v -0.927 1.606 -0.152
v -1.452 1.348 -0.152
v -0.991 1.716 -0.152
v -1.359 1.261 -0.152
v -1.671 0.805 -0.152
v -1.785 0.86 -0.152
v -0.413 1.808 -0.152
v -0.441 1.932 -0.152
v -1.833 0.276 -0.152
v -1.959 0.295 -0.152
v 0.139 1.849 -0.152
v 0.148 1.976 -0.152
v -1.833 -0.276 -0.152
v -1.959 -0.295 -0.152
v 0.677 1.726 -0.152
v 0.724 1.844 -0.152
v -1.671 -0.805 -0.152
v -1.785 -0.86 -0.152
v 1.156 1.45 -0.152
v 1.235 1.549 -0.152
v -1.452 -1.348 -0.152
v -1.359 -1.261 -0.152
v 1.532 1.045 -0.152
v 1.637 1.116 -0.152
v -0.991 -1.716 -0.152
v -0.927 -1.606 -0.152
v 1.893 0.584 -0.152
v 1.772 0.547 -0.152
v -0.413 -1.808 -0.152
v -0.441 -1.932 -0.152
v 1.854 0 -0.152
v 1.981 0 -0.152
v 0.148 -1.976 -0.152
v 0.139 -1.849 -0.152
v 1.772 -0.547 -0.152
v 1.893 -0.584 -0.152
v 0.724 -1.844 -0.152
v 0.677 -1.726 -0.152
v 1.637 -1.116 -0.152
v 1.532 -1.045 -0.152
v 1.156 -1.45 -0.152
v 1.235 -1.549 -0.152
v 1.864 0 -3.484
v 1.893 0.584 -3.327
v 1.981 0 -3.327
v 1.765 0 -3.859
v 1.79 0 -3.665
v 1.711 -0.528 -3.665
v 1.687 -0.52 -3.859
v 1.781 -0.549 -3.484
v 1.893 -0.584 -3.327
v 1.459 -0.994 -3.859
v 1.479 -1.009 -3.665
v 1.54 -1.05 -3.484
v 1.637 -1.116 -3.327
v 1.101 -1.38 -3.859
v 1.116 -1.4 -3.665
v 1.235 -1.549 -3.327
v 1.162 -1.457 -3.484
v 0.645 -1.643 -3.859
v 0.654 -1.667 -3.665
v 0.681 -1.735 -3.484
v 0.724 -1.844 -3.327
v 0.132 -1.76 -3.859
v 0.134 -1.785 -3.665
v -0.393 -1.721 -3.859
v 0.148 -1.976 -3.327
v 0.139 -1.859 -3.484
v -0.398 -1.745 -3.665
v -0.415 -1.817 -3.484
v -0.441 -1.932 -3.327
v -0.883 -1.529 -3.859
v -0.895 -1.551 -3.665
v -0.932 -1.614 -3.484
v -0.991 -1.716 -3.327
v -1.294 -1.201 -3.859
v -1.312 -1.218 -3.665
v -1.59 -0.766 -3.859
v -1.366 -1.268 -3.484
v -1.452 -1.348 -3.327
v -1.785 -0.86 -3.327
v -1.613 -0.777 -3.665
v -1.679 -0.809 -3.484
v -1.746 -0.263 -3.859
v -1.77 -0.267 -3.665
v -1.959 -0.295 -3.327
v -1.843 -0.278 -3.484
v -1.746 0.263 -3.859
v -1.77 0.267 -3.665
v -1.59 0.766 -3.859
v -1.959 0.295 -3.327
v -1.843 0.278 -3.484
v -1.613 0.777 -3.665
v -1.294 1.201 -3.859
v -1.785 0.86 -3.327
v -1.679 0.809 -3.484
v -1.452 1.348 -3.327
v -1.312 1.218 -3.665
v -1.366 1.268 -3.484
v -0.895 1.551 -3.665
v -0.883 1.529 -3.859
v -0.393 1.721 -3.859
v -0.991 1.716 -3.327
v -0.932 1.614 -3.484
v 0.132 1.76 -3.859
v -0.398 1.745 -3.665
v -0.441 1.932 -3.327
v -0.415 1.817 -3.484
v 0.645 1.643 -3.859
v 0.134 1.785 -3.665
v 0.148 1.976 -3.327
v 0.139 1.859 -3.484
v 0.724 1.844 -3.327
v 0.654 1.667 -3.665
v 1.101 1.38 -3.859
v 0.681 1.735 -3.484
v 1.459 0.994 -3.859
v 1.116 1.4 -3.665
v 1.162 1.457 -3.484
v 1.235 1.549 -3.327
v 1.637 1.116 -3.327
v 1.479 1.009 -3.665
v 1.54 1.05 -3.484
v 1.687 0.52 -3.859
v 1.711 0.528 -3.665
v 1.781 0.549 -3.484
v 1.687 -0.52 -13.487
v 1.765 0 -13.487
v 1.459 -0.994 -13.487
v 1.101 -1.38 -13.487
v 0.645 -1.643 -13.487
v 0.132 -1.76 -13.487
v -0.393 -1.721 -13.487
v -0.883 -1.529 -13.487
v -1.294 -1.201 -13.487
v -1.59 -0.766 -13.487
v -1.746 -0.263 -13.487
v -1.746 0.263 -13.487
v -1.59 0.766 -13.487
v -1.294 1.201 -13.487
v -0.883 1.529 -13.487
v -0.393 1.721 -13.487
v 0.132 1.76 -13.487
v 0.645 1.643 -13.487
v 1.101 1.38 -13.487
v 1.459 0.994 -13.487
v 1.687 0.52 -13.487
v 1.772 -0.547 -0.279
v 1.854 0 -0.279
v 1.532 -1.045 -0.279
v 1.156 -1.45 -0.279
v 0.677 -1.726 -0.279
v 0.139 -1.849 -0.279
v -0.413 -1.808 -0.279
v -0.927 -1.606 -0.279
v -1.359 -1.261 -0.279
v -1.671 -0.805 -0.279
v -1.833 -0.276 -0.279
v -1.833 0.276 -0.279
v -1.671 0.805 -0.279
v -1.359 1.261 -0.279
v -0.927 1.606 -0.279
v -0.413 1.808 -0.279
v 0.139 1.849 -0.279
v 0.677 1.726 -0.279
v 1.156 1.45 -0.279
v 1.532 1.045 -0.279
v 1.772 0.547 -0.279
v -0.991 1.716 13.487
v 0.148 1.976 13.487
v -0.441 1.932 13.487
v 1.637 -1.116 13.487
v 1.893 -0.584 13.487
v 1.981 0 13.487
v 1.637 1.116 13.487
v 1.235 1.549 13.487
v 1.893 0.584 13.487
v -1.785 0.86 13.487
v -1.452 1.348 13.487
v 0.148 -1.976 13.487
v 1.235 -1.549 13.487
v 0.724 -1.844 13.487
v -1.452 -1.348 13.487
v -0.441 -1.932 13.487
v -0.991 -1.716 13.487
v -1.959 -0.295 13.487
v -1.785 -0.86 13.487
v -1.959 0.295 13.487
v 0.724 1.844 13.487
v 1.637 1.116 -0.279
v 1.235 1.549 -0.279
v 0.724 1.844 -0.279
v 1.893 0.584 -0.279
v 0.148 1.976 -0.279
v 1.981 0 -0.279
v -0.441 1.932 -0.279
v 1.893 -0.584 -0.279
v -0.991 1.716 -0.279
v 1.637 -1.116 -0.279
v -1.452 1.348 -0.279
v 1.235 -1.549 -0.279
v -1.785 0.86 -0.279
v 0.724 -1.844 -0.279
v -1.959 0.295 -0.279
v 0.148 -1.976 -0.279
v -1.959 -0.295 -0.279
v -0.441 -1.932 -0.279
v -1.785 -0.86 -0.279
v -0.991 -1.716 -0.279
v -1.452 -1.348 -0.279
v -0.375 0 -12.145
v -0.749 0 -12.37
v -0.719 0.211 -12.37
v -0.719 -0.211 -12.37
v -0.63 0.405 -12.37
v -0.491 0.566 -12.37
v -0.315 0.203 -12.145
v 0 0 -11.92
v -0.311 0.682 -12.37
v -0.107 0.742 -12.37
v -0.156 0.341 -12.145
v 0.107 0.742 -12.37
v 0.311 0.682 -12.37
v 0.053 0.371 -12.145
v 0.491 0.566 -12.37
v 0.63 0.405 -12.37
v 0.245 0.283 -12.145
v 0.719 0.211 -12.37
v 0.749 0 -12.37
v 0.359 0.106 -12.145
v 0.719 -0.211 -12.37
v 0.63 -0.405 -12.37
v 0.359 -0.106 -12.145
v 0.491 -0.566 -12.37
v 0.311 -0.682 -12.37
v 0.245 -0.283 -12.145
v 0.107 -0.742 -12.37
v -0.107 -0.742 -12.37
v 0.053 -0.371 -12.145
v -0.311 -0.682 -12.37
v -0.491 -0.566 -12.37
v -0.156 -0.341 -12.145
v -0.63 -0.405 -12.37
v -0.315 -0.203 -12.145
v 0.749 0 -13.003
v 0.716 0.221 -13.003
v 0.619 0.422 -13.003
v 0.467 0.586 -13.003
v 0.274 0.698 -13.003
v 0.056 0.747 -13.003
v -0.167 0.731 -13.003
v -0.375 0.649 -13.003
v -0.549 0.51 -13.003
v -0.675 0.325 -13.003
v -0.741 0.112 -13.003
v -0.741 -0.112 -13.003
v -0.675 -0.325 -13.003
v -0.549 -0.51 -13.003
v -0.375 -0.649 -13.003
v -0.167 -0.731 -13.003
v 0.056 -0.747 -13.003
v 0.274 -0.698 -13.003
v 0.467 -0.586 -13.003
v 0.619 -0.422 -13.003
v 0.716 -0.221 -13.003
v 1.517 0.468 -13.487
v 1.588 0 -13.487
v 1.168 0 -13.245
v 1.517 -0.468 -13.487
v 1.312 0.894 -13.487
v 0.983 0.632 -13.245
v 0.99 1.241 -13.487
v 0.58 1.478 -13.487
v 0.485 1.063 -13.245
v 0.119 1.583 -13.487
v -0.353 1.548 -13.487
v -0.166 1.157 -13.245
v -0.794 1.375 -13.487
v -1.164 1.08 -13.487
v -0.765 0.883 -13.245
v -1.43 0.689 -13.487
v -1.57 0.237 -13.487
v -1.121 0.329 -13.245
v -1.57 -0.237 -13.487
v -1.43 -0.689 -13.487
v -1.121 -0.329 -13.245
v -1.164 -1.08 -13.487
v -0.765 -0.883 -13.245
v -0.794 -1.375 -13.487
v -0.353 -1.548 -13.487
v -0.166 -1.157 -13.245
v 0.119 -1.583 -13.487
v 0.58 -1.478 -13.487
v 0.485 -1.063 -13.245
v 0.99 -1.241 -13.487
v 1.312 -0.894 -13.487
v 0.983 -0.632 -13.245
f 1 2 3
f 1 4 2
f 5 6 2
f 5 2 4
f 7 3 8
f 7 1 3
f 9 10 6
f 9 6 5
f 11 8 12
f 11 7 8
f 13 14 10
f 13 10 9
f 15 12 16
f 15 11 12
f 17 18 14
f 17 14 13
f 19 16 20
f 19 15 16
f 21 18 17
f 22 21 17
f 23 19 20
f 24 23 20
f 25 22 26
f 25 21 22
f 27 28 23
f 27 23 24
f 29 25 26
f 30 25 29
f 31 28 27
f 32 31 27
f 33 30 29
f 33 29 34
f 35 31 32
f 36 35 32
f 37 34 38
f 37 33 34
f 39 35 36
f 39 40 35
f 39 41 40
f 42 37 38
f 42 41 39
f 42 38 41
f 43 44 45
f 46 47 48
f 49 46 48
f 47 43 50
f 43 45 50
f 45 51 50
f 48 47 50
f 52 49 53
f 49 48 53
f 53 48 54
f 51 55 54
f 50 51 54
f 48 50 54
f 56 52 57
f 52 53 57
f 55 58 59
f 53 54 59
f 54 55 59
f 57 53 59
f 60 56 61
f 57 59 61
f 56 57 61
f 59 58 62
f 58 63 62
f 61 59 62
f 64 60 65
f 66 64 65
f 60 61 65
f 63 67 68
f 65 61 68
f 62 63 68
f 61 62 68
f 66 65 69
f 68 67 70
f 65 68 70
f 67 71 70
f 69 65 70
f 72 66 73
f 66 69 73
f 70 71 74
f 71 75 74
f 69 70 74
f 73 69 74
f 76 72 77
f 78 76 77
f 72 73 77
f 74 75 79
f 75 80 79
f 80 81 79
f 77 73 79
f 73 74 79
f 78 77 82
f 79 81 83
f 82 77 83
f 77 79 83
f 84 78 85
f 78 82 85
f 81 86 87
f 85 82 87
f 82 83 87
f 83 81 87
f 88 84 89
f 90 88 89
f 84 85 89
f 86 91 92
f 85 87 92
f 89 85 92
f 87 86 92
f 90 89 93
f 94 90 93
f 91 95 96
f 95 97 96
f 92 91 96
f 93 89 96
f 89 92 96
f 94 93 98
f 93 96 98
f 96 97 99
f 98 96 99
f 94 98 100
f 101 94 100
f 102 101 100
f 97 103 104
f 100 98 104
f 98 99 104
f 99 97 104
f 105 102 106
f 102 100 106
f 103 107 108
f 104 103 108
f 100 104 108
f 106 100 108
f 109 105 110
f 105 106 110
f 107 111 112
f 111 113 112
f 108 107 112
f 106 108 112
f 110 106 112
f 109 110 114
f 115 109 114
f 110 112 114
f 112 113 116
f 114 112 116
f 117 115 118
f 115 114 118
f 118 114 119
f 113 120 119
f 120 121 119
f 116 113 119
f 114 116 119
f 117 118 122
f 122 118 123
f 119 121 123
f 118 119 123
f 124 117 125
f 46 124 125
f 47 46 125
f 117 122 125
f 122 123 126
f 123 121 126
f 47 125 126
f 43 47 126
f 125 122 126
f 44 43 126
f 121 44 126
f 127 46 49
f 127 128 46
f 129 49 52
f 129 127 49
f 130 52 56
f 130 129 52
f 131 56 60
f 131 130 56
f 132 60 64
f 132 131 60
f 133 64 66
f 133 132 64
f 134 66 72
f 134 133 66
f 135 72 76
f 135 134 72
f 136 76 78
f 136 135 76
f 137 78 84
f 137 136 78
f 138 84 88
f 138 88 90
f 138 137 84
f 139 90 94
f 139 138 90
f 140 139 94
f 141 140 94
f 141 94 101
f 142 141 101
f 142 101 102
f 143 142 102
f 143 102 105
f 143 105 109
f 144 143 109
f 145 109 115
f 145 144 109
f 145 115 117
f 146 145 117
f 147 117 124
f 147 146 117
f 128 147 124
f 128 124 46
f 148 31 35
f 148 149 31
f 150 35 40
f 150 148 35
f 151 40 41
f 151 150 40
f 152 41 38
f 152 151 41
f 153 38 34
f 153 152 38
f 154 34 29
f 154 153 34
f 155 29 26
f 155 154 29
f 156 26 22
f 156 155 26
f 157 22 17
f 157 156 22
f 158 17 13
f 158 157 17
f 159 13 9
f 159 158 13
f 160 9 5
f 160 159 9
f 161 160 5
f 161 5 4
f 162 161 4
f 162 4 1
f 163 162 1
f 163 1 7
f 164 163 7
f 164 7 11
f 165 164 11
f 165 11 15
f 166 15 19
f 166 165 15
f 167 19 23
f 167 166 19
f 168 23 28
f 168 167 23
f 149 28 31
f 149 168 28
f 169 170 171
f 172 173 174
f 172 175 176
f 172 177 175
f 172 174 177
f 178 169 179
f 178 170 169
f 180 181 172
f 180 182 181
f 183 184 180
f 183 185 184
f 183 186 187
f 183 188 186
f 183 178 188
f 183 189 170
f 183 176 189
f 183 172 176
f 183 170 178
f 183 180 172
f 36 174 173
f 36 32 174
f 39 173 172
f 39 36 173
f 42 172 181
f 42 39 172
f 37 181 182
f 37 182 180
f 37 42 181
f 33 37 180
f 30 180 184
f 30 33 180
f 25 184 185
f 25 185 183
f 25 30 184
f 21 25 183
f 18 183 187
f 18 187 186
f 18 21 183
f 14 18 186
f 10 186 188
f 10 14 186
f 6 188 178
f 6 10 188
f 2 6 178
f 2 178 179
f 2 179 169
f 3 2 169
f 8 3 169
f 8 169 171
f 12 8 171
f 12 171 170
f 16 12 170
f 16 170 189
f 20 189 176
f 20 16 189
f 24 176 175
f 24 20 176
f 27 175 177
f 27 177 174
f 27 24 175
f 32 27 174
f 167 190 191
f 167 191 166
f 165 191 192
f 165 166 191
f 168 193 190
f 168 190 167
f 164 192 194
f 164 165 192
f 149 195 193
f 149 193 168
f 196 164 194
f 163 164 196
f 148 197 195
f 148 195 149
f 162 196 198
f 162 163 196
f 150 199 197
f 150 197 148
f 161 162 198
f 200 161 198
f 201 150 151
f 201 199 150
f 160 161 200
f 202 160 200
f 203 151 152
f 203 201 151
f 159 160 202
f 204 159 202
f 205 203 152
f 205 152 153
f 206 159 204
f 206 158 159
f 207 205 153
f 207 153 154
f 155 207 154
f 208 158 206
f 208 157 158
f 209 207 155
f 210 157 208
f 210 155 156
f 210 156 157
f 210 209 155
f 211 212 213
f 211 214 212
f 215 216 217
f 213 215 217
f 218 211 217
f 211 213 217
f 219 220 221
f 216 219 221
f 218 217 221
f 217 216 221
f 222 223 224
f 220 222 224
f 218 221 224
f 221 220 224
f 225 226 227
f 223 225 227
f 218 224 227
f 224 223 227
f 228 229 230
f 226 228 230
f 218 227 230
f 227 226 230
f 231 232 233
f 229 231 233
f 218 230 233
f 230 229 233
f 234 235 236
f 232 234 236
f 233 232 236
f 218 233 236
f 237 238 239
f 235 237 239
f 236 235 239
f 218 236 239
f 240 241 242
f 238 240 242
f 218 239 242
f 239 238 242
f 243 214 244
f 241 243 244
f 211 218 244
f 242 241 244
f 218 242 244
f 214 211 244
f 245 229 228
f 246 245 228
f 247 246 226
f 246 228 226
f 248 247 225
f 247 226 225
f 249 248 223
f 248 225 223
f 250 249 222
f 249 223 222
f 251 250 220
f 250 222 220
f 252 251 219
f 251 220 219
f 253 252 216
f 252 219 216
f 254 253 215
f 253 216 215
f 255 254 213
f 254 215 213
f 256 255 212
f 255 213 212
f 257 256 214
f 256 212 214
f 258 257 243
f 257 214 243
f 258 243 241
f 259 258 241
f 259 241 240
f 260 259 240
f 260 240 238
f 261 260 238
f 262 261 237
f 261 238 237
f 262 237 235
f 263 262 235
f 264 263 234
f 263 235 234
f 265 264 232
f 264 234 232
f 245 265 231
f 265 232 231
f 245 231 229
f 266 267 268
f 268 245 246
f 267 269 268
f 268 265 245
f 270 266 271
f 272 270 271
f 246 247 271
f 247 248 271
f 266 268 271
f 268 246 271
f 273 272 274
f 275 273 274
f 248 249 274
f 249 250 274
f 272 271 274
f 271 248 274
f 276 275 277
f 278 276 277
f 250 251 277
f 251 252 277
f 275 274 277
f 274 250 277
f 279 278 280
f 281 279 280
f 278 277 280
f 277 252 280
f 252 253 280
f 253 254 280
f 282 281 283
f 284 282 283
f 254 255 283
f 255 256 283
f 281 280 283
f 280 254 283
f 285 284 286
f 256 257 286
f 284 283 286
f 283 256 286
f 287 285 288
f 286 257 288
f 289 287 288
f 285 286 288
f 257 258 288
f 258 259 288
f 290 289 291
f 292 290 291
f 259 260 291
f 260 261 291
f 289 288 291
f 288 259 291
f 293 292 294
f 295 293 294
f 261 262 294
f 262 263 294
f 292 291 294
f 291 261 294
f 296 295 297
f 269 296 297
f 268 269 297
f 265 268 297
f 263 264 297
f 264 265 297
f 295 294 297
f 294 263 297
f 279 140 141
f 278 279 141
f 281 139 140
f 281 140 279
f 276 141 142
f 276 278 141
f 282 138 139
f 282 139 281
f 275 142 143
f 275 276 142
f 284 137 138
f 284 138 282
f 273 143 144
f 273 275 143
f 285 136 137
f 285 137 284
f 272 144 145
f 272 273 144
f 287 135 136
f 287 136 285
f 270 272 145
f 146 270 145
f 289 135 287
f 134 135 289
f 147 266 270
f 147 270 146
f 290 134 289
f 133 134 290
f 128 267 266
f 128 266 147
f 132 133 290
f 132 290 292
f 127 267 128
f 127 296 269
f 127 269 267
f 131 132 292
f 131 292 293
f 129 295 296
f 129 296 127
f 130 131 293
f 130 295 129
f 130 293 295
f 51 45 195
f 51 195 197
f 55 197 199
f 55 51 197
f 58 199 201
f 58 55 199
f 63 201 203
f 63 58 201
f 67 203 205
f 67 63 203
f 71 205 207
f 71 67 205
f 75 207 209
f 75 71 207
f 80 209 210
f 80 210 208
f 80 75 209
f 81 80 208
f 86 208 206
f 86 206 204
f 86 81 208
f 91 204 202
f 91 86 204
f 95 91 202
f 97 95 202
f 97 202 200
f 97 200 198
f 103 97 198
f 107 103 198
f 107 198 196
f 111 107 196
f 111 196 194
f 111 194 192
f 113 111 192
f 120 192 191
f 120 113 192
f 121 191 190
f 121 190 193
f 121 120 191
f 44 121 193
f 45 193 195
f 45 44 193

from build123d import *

# Parameters (mm, degrees)
REDONDEO1_R                      = 0.762
TALADRO_DE_MARGEN_PARA_101_D     = 1.4986
TALADRO_DE_MARGEN_PARA_101_DEPTH = 1.1176
TALADRO_DE_MARGEN_PARA_101_TIP   = 0.450224862
CHAFL_N1_SIZE                    = 0.8382
CHAFL_N1_SIZE2                   = 0.483934996


with BuildPart() as part:
    # Croquis1 → Revolución1 (revolve)
    with BuildSketch(Plane(origin=(0, 0, 0), x_dir=(0, 0, -1), z_dir=(1, 0, 0)), mode=Mode.PRIVATE) as revoluci_n1_sk:
        Polygon((-13.4874, 0), (-13.4874, 1.9812), (0.1524, 1.9812), (0.1524, 1.8542), (0.2794, 1.8542), (0.2794, 1.9812), (3.3274, 1.9812), (3.3274, 1.7653), (13.4874, 1.7653), (13.4874, 0), align=None)
    revolve(revoluci_n1_sk.sketch.rotate(Axis((0, 0, 127), (0, 0, -1)), 90), axis=Axis((0, 0, 127), (0, 0, -1)))

    # Redondeo1
    # the kernel refuses this fillet: 0.762 mm, written as the material it adds along each edge
    with BuildSketch(Plane(origin=(0, 0, -3.3274), x_dir=(1, 0, 0), z_dir=(0, 1, 0))) as redondeo1_piece_1:
        with BuildLine():
            CenterArc((2.5273, 0.531430889), REDONDEO1_R, 180, 44.220044428)
            Line((1.7653, 0.531430889), (1.75006, 0.531430889))
            Line((1.75006, 0.531430889), (1.75006, 0))
            Line((1.75006, 0), (1.7653, -0.01524))
            ThreePointArc((1.7653, -0.01524), (1.87325, -0.01524), (1.970278, -0.010628618))
            Line((1.970278, -0.010628618), (1.9812, 0))
        make_face()
    revolve(axis=Axis((0, 0, -3.3274), (0, 0, -1)))

    # Taladro de margen para #101
    with Locations(Plane(origin=(0, 0, -13.4874), x_dir=(-1, 0, 0), z_dir=(0, 0, -1))):
        with Locations((0, 0)):
            Hole(TALADRO_DE_MARGEN_PARA_101_D / 2, depth=TALADRO_DE_MARGEN_PARA_101_DEPTH)
            with Locations((0, 0, -(TALADRO_DE_MARGEN_PARA_101_DEPTH + TALADRO_DE_MARGEN_PARA_101_TIP / 2))):  # 118° drill point
                Cone(0, TALADRO_DE_MARGEN_PARA_101_D / 2, TALADRO_DE_MARGEN_PARA_101_TIP, mode=Mode.SUBTRACT)

    # Chaflán1
    chafl_n1_edges = [part.edges().sort_by_distance(p)[0] for p in [
        (-0.7493, 0, -13.4874),
    ]]
    chafl_n1_side = [part.faces().sort_by_distance(p)[0] for p in [
        (-1.715369776, 0, -13.4874),
    ]]
    chamfer(chafl_n1_edges, length=CHAFL_N1_SIZE, length2=CHAFL_N1_SIZE2, reference=chafl_n1_side[0])


solid = part.part
